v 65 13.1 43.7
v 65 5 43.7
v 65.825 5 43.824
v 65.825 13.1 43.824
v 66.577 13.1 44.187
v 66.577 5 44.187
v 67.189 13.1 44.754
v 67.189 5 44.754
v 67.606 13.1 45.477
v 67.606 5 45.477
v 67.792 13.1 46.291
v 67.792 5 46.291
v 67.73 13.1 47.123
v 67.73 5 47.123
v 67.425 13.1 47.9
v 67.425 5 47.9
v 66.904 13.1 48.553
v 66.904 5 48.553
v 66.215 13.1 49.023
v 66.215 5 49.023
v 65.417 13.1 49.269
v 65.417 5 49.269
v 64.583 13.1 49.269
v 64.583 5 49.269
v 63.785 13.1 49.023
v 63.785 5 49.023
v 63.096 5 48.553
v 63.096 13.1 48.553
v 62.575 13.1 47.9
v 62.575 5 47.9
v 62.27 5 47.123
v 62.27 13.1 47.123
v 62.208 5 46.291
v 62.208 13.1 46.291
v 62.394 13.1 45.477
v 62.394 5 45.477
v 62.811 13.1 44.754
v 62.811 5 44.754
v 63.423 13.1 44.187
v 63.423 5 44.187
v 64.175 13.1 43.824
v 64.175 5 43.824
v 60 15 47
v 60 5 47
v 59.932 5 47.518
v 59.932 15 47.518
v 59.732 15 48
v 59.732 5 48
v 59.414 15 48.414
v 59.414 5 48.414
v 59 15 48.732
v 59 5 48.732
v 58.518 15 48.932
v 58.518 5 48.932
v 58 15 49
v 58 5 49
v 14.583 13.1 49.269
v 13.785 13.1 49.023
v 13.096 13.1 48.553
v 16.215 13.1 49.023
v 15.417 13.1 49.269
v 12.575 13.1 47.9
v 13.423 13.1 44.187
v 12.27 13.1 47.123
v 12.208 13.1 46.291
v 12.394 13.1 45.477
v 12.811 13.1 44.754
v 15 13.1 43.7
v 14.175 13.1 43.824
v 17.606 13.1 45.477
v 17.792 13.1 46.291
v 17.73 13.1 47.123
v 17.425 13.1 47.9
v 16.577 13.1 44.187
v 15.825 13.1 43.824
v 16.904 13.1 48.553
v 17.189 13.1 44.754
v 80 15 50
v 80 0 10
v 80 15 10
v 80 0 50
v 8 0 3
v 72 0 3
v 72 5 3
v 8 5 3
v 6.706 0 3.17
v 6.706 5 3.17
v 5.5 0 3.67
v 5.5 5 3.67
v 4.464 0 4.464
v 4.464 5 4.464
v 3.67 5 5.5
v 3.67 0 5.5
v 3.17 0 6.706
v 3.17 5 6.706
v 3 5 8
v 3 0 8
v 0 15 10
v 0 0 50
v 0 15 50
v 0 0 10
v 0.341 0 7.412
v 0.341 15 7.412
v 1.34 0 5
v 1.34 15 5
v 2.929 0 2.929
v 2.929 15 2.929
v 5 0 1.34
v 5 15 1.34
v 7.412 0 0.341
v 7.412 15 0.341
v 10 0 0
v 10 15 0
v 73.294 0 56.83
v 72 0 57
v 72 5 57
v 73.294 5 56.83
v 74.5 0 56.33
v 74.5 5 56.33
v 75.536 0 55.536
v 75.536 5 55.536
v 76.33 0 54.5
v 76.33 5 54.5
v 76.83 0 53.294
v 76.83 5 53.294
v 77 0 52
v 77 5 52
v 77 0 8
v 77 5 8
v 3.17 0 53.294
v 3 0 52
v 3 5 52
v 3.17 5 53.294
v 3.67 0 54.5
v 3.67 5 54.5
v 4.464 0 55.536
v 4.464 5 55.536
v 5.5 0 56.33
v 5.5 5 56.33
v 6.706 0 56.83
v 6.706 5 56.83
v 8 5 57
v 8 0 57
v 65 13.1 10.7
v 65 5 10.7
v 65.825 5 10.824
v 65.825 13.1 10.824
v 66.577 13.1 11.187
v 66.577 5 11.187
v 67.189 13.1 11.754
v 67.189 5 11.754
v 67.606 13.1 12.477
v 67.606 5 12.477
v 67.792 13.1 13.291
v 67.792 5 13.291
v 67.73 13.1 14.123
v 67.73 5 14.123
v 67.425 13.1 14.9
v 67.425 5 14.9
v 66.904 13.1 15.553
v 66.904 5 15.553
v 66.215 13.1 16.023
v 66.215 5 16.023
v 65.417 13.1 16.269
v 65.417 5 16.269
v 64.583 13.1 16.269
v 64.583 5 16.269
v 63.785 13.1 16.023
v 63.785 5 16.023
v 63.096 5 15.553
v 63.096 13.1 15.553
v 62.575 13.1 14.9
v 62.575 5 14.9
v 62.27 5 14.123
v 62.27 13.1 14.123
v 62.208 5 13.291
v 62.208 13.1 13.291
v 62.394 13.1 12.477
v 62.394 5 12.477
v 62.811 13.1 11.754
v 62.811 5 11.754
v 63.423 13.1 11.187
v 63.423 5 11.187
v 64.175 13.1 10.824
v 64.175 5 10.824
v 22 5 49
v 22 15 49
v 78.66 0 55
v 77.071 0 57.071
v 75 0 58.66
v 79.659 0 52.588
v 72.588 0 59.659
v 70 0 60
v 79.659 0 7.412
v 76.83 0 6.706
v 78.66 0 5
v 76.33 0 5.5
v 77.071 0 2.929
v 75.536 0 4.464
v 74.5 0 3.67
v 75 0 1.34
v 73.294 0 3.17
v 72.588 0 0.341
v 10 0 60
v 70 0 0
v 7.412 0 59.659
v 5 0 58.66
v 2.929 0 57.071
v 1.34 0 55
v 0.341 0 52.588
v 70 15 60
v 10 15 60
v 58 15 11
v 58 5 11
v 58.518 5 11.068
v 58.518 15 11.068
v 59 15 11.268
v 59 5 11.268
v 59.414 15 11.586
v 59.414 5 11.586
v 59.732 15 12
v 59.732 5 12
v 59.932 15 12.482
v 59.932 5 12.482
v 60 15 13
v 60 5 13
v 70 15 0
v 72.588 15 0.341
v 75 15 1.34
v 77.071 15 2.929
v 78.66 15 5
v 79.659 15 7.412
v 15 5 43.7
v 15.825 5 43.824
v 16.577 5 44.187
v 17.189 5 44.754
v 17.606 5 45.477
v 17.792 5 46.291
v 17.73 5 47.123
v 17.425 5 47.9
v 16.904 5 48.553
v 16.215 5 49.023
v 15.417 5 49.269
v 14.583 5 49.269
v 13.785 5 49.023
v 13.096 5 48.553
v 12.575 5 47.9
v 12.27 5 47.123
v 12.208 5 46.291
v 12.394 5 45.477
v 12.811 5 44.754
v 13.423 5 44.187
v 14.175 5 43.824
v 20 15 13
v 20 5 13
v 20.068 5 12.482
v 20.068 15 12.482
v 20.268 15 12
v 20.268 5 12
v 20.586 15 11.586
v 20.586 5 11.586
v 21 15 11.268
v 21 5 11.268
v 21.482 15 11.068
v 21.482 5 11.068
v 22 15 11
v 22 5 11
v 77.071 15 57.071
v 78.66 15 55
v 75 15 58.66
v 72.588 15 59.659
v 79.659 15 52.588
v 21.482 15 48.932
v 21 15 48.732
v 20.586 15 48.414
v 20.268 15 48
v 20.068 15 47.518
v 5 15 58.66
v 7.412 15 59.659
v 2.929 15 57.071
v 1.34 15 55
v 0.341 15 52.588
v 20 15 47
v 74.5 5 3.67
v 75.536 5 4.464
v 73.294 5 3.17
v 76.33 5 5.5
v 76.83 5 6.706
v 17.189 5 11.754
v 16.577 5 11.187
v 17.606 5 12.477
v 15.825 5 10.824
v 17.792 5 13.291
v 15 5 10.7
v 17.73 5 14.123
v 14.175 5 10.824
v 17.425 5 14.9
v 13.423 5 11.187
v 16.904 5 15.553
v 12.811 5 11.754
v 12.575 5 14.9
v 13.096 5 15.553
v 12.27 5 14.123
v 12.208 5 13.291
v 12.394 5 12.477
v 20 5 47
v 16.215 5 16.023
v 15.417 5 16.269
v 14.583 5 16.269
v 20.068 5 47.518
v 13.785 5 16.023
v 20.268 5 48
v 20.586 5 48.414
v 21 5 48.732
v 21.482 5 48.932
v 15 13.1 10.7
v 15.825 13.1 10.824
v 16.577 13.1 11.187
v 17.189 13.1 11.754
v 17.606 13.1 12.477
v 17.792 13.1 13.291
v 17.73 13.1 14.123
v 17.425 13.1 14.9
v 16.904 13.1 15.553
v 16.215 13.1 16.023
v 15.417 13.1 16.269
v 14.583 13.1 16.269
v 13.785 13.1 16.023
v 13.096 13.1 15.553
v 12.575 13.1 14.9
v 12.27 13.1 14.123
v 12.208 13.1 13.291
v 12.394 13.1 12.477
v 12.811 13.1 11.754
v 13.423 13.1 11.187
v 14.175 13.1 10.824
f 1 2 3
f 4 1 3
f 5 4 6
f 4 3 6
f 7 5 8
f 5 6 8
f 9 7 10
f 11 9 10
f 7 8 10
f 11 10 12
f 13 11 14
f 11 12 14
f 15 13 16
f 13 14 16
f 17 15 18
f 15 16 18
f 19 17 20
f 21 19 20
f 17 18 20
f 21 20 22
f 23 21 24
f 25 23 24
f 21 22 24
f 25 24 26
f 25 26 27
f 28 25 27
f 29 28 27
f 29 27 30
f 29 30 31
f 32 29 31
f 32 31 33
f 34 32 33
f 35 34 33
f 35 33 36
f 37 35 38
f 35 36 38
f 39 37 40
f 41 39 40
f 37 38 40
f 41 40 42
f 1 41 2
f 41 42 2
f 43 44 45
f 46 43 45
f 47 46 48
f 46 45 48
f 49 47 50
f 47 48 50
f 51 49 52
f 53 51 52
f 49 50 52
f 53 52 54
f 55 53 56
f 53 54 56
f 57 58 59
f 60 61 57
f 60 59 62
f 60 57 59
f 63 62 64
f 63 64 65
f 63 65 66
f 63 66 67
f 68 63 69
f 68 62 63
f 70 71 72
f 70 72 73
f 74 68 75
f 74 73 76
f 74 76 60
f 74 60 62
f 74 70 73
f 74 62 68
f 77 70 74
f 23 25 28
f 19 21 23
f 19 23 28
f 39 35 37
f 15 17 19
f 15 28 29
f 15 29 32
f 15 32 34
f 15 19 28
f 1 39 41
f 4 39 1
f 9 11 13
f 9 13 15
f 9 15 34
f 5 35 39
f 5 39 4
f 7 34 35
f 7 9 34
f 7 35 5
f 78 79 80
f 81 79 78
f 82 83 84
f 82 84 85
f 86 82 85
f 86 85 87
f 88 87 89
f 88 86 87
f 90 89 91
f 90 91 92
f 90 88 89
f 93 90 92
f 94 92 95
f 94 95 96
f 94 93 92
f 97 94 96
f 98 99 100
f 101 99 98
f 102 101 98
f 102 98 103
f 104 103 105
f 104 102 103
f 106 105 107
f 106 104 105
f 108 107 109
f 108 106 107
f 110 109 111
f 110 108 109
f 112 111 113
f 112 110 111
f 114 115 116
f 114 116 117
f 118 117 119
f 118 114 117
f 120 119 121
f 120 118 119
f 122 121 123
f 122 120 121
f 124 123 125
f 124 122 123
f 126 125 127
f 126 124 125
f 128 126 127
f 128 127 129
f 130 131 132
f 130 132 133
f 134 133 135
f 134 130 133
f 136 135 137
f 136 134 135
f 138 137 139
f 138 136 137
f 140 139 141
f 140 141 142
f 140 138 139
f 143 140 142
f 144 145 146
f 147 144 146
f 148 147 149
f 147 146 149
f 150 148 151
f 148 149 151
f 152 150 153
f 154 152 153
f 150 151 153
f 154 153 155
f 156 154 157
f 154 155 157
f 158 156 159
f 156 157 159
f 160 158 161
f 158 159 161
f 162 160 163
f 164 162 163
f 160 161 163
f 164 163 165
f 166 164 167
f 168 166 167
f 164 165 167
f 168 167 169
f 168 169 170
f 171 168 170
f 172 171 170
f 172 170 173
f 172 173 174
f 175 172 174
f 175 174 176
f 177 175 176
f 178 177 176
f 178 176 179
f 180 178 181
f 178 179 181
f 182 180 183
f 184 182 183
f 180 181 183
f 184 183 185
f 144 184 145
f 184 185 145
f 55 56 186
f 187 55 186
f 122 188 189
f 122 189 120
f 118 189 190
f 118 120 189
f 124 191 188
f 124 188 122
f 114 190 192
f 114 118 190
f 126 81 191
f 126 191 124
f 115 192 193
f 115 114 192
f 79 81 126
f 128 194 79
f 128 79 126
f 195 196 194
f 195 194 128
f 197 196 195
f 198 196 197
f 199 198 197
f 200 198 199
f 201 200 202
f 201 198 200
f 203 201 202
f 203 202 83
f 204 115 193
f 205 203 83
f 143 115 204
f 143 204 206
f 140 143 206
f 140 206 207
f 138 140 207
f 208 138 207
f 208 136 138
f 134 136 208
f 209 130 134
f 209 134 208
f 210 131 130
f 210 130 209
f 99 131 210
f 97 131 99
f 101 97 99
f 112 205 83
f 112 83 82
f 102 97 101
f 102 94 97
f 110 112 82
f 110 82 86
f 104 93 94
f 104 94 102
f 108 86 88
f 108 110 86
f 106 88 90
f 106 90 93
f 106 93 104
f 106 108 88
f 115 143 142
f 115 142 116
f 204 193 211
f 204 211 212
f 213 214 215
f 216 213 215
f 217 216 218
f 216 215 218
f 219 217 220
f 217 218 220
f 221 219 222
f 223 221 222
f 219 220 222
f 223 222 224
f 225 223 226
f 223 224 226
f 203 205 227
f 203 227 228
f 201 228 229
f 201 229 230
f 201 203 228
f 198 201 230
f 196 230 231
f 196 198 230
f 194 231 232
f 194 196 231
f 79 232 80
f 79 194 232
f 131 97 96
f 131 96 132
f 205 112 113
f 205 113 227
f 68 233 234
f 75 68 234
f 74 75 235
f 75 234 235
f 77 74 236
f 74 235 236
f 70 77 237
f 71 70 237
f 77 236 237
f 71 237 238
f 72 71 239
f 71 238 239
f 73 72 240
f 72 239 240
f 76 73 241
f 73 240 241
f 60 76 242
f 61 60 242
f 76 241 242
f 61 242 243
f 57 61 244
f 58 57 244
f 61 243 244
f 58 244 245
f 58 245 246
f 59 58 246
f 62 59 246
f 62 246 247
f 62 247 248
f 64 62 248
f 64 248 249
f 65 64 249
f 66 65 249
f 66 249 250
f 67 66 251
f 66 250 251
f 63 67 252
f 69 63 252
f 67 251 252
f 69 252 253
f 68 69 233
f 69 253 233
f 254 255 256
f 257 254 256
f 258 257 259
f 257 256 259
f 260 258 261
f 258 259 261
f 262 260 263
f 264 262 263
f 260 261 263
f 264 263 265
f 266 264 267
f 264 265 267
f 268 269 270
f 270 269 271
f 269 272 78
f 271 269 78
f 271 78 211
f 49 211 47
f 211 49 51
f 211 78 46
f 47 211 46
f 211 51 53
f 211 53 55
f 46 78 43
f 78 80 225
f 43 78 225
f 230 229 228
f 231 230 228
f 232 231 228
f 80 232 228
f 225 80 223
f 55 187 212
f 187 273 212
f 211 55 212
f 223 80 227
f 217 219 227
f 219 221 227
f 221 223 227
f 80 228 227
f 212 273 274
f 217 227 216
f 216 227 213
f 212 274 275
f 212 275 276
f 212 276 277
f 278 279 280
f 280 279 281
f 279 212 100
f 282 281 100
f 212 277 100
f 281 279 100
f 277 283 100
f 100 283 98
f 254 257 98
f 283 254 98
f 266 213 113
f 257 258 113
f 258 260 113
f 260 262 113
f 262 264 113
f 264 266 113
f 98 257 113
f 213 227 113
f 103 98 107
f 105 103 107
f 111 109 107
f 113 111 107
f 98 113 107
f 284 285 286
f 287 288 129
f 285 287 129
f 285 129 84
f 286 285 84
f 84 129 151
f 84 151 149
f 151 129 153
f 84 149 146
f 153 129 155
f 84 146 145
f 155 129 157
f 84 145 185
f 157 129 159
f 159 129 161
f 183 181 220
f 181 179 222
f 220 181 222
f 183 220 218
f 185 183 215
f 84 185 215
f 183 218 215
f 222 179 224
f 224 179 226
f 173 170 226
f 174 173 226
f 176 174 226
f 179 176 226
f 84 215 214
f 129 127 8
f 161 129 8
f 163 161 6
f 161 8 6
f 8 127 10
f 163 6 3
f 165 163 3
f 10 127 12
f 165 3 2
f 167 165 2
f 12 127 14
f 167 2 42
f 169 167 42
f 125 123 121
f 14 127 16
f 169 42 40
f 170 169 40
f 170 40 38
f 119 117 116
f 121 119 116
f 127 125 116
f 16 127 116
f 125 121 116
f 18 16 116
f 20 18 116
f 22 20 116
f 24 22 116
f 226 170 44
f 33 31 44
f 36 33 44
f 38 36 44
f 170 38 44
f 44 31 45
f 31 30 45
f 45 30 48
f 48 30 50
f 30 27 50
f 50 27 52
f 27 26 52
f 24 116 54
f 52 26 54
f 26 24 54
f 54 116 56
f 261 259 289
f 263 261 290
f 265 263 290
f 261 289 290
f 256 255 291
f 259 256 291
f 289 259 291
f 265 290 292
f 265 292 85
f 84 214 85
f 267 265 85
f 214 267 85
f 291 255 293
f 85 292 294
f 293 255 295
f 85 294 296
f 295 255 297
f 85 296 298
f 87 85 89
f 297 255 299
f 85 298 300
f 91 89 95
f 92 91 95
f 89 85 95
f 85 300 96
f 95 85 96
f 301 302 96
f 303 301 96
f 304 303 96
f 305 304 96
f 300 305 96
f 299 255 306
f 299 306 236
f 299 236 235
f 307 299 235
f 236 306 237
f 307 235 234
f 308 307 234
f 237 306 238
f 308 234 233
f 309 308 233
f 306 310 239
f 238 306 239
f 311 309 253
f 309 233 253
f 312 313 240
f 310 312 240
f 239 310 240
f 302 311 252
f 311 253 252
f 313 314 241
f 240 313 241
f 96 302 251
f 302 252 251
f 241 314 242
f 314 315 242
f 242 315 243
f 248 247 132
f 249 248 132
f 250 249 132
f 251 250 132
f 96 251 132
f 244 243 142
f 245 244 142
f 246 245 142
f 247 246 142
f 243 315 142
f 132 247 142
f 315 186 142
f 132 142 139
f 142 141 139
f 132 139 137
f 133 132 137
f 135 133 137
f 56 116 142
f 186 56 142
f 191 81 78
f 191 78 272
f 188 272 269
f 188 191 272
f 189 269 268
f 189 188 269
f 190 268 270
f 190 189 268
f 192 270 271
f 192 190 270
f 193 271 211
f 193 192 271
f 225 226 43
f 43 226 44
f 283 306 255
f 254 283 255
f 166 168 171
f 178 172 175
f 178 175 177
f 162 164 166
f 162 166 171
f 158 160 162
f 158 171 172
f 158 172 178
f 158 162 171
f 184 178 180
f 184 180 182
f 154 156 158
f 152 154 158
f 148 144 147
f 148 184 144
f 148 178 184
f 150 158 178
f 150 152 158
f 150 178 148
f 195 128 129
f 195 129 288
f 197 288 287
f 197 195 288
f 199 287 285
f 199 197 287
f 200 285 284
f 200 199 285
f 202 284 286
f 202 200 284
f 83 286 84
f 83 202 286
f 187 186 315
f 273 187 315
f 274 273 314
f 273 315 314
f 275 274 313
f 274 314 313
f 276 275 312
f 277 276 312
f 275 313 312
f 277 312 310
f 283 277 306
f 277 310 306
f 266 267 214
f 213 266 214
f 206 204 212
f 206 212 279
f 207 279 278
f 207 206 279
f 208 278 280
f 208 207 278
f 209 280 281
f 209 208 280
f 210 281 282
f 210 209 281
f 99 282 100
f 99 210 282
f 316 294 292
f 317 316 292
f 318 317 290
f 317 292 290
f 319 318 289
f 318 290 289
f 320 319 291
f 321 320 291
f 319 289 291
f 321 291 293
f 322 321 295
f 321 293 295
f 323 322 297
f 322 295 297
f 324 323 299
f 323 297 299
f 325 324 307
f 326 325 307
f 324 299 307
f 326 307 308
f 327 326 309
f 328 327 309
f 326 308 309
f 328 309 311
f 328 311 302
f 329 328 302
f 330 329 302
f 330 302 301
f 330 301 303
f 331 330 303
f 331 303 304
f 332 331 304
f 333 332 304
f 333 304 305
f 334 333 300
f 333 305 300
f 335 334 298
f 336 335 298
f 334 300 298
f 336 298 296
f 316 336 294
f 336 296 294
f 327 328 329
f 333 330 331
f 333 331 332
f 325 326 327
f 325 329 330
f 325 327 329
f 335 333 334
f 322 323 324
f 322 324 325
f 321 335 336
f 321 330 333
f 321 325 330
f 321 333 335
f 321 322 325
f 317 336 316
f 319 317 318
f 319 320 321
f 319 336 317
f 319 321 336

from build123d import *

# Parameters (mm, degrees)
BOSS_EXTRU_1_DEPTH      = 15
ENL_V_MAT_EXTRU_1_DEPTH = 5
ESQUISSE3_R             = 2.8
ENL_V_MAT_EXTRU_2_DEPTH = 8.1


with BuildPart() as part:
    # Esquisse1 → Boss.-Extru.1 (new body)
    with BuildSketch(Plane(origin=(0, 0, 0), x_dir=(1, 0, 0), z_dir=(0, 1, 0))):
        with BuildLine():
            Line((10, 0), (70, 0))
            ThreePointArc((70, 0), (77.071067812, -2.928932188), (80, -10))
            Line((80, -10), (80, -50))
            ThreePointArc((80, -50), (77.071067812, -57.071067812), (70, -60))
            Line((70, -60), (10, -60))
            ThreePointArc((10, -60), (2.928932188, -57.071067812), (0, -50))
            Line((0, -50), (0, -10))
            ThreePointArc((0, -10), (2.928932188, -2.928932188), (10, 0))
        make_face()
        with BuildLine():
            Line((58, -49), (22, -49))
            ThreePointArc((22, -49), (20.585786438, -48.414213562), (20, -47))
            Line((20, -47), (20, -13))
            ThreePointArc((20, -13), (20.585786438, -11.585786438), (22, -11))
            Line((22, -11), (58, -11))
            ThreePointArc((58, -11), (59.414213562, -11.585786438), (60, -13))
            Line((60, -13), (60, -47))
            ThreePointArc((60, -47), (59.414213562, -48.414213562), (58, -49))
        make_face(mode=Mode.SUBTRACT)
    extrude(amount=BOSS_EXTRU_1_DEPTH)

    # Esquisse2 → Enlèv. mat.-Extru.1 (cut)
    with BuildSketch(Plane.XZ):
        with BuildLine():
            Line((8, 57), (72, 57))
            ThreePointArc((72, 57), (75.535533906, 55.535533906), (77, 52))
            Line((77, 52), (77, 8))
            ThreePointArc((77, 8), (75.535533906, 4.464466094), (72, 3))
            Line((72, 3), (8, 3))
            ThreePointArc((8, 3), (4.464466094, 4.464466094), (3, 8))
            Line((3, 8), (3, 52))
            ThreePointArc((3, 52), (4.464466094, 55.535533906), (8, 57))
        make_face()
    extrude(amount=-ENL_V_MAT_EXTRU_1_DEPTH, mode=Mode.SUBTRACT)

    # Esquisse3 → Enlèv. mat.-Extru.2 (cut)
    with BuildSketch(Plane.XZ.offset(-5)):
        with Locations(Location((65, 13.5, 0), (0, 0, 270))):
            Circle(ESQUISSE3_R)
        with Locations(Location((65, 46.5, 0), (0, 0, 270))):
            Circle(ESQUISSE3_R)
        with Locations(Location((15, 13.5, 0), (0, 0, 270))):
            Circle(ESQUISSE3_R)
        with Locations(Location((15, 46.5, 0), (0, 0, 270))):
            Circle(ESQUISSE3_R)
    extrude(amount=-ENL_V_MAT_EXTRU_2_DEPTH, mode=Mode.SUBTRACT)


solid = part.part
